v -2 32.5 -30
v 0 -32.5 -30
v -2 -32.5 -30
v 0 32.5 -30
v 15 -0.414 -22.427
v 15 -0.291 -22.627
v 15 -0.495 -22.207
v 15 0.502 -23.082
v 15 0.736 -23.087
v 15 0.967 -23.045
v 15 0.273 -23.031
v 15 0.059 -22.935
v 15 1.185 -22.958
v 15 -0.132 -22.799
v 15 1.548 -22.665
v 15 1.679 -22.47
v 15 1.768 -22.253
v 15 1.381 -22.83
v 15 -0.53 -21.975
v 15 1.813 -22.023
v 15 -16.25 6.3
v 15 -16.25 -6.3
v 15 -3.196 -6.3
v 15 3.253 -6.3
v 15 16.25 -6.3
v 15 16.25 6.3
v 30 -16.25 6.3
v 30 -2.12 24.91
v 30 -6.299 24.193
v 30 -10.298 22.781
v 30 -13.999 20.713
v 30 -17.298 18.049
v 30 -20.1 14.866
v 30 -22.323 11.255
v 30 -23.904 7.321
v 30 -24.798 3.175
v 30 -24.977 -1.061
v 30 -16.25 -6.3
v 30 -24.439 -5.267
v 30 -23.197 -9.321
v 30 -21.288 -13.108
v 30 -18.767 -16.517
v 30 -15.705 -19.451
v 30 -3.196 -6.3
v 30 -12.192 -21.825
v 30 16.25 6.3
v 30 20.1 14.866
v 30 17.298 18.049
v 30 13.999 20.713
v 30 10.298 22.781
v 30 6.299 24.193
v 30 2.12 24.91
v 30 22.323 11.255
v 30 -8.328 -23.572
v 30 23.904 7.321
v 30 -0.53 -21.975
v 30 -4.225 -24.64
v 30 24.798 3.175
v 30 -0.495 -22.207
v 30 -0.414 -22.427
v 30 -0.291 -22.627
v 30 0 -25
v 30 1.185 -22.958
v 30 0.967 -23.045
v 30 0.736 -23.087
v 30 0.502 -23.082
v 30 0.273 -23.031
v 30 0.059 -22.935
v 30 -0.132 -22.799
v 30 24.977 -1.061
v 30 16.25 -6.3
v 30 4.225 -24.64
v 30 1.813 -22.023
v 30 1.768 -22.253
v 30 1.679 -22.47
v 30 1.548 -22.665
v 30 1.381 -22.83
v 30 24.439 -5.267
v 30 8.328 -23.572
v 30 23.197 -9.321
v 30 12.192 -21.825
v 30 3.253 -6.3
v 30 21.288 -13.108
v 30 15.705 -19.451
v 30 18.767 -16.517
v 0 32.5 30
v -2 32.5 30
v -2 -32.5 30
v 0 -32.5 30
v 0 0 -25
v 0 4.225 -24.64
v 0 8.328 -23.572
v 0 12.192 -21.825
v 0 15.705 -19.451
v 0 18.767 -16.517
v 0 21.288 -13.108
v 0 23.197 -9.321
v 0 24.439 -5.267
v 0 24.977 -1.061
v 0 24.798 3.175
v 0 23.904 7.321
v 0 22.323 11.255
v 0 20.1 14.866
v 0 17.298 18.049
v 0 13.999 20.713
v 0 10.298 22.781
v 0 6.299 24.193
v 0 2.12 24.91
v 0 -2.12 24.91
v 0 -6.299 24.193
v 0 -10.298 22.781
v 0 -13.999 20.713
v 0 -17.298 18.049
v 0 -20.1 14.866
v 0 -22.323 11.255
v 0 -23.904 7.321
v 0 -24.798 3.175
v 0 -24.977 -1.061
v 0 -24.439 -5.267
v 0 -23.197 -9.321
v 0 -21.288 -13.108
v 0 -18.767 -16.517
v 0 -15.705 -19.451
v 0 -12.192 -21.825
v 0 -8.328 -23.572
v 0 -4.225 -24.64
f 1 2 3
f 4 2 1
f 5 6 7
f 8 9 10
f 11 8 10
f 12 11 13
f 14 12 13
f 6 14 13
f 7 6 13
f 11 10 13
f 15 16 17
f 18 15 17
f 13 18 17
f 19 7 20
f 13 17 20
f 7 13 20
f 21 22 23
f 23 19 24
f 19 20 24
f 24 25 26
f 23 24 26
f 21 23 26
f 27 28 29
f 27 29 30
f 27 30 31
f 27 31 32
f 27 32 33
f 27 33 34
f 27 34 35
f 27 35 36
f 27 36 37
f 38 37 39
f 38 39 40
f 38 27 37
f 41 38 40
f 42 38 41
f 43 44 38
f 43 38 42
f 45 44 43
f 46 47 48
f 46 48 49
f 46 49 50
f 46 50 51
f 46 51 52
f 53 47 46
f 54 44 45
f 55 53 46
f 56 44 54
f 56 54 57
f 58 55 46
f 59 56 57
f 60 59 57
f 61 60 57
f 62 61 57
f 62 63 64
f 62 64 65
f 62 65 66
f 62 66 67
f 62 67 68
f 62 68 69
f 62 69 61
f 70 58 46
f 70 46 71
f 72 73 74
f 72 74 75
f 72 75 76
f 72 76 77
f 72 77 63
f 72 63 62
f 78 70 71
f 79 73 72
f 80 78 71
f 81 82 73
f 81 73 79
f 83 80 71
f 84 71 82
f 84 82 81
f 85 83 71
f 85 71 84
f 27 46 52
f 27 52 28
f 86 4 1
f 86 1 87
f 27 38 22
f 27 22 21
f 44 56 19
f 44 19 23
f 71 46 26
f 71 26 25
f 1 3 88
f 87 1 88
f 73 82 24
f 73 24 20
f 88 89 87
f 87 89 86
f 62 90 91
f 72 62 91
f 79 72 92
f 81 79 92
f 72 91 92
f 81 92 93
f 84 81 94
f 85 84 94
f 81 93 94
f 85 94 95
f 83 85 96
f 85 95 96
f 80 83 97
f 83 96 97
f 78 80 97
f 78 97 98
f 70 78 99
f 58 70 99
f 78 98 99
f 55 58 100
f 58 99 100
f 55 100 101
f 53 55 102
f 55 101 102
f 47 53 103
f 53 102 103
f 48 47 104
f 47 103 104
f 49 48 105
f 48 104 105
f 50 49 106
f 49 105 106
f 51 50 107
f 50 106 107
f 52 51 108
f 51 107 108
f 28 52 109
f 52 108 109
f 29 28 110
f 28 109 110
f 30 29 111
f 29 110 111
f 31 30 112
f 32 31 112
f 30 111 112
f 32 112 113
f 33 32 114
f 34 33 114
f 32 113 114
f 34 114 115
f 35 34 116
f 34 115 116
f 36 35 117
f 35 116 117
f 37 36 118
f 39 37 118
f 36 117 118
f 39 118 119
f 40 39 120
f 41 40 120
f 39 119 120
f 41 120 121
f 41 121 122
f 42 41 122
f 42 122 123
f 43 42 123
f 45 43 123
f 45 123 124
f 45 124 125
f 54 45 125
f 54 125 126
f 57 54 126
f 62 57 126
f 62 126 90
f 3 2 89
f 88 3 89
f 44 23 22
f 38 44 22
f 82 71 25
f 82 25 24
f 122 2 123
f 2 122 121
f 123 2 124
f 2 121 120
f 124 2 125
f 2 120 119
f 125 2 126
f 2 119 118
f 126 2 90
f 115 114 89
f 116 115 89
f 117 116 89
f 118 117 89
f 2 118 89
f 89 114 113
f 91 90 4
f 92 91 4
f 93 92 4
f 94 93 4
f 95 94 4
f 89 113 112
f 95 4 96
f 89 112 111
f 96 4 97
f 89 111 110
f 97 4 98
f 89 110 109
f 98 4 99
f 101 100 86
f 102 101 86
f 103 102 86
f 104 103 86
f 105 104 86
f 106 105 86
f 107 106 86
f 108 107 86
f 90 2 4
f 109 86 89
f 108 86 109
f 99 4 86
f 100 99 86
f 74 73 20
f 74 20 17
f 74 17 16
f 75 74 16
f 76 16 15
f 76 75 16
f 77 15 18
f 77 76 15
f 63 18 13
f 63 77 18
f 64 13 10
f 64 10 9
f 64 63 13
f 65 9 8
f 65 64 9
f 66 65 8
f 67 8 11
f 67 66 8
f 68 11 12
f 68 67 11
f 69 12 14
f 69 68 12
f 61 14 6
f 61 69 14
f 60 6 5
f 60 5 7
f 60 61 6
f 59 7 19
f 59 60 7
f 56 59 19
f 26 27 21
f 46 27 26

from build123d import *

# Parameters (mm, degrees)
SKETCH3_R           = 25
BOSS_EXTRUDE2_DEPTH = 30
CUT_EXTRUDE1_DEPTH  = 15
SKETCH6_W           = 60
SKETCH6_H           = 65
BOSS_EXTRUDE3_DEPTH = 2


with BuildPart() as part:
    # Sketch3 → Boss-Extrude2 (new body)
    with BuildSketch(Plane(origin=(0, 0, 0), x_dir=(0, 0, -1), z_dir=(1, 0, 0))):
        Circle(SKETCH3_R)
    extrude(amount=BOSS_EXTRUDE2_DEPTH)

    # Sketch4 → Cut-Extrude1 (cut)
    with BuildSketch(Plane(origin=(30, 0, 0), x_dir=(0, 0, -1), z_dir=(1, 0, 0))):
        with BuildLine():
            Line((6.3, 3.252817327), (22.023267424, 1.812565295))
            ThreePointArc((22.023267424, 1.812565295), (23.090240495, 0.619111869), (21.975368687, -0.529723832))
            Line((21.975368687, -0.529723832), (6.3, -3.196442617))
            Line((6.3, -3.196442617), (6.3, -16.25))
            Line((6.3, -16.25), (-6.3, -16.25))
            Line((-6.3, -16.25), (-6.3, 16.25))
            Line((-6.3, 16.25), (6.3, 16.25))
            Line((6.3, 16.25), (6.3, 3.252817327))
        make_face()
    extrude(amount=-CUT_EXTRUDE1_DEPTH, mode=Mode.SUBTRACT)

    # Sketch6 → Boss-Extrude3 (add)
    with BuildSketch(Plane.ZY):
        Rectangle(SKETCH6_W, SKETCH6_H)
    extrude(amount=BOSS_EXTRUDE3_DEPTH)


solid = part.part
